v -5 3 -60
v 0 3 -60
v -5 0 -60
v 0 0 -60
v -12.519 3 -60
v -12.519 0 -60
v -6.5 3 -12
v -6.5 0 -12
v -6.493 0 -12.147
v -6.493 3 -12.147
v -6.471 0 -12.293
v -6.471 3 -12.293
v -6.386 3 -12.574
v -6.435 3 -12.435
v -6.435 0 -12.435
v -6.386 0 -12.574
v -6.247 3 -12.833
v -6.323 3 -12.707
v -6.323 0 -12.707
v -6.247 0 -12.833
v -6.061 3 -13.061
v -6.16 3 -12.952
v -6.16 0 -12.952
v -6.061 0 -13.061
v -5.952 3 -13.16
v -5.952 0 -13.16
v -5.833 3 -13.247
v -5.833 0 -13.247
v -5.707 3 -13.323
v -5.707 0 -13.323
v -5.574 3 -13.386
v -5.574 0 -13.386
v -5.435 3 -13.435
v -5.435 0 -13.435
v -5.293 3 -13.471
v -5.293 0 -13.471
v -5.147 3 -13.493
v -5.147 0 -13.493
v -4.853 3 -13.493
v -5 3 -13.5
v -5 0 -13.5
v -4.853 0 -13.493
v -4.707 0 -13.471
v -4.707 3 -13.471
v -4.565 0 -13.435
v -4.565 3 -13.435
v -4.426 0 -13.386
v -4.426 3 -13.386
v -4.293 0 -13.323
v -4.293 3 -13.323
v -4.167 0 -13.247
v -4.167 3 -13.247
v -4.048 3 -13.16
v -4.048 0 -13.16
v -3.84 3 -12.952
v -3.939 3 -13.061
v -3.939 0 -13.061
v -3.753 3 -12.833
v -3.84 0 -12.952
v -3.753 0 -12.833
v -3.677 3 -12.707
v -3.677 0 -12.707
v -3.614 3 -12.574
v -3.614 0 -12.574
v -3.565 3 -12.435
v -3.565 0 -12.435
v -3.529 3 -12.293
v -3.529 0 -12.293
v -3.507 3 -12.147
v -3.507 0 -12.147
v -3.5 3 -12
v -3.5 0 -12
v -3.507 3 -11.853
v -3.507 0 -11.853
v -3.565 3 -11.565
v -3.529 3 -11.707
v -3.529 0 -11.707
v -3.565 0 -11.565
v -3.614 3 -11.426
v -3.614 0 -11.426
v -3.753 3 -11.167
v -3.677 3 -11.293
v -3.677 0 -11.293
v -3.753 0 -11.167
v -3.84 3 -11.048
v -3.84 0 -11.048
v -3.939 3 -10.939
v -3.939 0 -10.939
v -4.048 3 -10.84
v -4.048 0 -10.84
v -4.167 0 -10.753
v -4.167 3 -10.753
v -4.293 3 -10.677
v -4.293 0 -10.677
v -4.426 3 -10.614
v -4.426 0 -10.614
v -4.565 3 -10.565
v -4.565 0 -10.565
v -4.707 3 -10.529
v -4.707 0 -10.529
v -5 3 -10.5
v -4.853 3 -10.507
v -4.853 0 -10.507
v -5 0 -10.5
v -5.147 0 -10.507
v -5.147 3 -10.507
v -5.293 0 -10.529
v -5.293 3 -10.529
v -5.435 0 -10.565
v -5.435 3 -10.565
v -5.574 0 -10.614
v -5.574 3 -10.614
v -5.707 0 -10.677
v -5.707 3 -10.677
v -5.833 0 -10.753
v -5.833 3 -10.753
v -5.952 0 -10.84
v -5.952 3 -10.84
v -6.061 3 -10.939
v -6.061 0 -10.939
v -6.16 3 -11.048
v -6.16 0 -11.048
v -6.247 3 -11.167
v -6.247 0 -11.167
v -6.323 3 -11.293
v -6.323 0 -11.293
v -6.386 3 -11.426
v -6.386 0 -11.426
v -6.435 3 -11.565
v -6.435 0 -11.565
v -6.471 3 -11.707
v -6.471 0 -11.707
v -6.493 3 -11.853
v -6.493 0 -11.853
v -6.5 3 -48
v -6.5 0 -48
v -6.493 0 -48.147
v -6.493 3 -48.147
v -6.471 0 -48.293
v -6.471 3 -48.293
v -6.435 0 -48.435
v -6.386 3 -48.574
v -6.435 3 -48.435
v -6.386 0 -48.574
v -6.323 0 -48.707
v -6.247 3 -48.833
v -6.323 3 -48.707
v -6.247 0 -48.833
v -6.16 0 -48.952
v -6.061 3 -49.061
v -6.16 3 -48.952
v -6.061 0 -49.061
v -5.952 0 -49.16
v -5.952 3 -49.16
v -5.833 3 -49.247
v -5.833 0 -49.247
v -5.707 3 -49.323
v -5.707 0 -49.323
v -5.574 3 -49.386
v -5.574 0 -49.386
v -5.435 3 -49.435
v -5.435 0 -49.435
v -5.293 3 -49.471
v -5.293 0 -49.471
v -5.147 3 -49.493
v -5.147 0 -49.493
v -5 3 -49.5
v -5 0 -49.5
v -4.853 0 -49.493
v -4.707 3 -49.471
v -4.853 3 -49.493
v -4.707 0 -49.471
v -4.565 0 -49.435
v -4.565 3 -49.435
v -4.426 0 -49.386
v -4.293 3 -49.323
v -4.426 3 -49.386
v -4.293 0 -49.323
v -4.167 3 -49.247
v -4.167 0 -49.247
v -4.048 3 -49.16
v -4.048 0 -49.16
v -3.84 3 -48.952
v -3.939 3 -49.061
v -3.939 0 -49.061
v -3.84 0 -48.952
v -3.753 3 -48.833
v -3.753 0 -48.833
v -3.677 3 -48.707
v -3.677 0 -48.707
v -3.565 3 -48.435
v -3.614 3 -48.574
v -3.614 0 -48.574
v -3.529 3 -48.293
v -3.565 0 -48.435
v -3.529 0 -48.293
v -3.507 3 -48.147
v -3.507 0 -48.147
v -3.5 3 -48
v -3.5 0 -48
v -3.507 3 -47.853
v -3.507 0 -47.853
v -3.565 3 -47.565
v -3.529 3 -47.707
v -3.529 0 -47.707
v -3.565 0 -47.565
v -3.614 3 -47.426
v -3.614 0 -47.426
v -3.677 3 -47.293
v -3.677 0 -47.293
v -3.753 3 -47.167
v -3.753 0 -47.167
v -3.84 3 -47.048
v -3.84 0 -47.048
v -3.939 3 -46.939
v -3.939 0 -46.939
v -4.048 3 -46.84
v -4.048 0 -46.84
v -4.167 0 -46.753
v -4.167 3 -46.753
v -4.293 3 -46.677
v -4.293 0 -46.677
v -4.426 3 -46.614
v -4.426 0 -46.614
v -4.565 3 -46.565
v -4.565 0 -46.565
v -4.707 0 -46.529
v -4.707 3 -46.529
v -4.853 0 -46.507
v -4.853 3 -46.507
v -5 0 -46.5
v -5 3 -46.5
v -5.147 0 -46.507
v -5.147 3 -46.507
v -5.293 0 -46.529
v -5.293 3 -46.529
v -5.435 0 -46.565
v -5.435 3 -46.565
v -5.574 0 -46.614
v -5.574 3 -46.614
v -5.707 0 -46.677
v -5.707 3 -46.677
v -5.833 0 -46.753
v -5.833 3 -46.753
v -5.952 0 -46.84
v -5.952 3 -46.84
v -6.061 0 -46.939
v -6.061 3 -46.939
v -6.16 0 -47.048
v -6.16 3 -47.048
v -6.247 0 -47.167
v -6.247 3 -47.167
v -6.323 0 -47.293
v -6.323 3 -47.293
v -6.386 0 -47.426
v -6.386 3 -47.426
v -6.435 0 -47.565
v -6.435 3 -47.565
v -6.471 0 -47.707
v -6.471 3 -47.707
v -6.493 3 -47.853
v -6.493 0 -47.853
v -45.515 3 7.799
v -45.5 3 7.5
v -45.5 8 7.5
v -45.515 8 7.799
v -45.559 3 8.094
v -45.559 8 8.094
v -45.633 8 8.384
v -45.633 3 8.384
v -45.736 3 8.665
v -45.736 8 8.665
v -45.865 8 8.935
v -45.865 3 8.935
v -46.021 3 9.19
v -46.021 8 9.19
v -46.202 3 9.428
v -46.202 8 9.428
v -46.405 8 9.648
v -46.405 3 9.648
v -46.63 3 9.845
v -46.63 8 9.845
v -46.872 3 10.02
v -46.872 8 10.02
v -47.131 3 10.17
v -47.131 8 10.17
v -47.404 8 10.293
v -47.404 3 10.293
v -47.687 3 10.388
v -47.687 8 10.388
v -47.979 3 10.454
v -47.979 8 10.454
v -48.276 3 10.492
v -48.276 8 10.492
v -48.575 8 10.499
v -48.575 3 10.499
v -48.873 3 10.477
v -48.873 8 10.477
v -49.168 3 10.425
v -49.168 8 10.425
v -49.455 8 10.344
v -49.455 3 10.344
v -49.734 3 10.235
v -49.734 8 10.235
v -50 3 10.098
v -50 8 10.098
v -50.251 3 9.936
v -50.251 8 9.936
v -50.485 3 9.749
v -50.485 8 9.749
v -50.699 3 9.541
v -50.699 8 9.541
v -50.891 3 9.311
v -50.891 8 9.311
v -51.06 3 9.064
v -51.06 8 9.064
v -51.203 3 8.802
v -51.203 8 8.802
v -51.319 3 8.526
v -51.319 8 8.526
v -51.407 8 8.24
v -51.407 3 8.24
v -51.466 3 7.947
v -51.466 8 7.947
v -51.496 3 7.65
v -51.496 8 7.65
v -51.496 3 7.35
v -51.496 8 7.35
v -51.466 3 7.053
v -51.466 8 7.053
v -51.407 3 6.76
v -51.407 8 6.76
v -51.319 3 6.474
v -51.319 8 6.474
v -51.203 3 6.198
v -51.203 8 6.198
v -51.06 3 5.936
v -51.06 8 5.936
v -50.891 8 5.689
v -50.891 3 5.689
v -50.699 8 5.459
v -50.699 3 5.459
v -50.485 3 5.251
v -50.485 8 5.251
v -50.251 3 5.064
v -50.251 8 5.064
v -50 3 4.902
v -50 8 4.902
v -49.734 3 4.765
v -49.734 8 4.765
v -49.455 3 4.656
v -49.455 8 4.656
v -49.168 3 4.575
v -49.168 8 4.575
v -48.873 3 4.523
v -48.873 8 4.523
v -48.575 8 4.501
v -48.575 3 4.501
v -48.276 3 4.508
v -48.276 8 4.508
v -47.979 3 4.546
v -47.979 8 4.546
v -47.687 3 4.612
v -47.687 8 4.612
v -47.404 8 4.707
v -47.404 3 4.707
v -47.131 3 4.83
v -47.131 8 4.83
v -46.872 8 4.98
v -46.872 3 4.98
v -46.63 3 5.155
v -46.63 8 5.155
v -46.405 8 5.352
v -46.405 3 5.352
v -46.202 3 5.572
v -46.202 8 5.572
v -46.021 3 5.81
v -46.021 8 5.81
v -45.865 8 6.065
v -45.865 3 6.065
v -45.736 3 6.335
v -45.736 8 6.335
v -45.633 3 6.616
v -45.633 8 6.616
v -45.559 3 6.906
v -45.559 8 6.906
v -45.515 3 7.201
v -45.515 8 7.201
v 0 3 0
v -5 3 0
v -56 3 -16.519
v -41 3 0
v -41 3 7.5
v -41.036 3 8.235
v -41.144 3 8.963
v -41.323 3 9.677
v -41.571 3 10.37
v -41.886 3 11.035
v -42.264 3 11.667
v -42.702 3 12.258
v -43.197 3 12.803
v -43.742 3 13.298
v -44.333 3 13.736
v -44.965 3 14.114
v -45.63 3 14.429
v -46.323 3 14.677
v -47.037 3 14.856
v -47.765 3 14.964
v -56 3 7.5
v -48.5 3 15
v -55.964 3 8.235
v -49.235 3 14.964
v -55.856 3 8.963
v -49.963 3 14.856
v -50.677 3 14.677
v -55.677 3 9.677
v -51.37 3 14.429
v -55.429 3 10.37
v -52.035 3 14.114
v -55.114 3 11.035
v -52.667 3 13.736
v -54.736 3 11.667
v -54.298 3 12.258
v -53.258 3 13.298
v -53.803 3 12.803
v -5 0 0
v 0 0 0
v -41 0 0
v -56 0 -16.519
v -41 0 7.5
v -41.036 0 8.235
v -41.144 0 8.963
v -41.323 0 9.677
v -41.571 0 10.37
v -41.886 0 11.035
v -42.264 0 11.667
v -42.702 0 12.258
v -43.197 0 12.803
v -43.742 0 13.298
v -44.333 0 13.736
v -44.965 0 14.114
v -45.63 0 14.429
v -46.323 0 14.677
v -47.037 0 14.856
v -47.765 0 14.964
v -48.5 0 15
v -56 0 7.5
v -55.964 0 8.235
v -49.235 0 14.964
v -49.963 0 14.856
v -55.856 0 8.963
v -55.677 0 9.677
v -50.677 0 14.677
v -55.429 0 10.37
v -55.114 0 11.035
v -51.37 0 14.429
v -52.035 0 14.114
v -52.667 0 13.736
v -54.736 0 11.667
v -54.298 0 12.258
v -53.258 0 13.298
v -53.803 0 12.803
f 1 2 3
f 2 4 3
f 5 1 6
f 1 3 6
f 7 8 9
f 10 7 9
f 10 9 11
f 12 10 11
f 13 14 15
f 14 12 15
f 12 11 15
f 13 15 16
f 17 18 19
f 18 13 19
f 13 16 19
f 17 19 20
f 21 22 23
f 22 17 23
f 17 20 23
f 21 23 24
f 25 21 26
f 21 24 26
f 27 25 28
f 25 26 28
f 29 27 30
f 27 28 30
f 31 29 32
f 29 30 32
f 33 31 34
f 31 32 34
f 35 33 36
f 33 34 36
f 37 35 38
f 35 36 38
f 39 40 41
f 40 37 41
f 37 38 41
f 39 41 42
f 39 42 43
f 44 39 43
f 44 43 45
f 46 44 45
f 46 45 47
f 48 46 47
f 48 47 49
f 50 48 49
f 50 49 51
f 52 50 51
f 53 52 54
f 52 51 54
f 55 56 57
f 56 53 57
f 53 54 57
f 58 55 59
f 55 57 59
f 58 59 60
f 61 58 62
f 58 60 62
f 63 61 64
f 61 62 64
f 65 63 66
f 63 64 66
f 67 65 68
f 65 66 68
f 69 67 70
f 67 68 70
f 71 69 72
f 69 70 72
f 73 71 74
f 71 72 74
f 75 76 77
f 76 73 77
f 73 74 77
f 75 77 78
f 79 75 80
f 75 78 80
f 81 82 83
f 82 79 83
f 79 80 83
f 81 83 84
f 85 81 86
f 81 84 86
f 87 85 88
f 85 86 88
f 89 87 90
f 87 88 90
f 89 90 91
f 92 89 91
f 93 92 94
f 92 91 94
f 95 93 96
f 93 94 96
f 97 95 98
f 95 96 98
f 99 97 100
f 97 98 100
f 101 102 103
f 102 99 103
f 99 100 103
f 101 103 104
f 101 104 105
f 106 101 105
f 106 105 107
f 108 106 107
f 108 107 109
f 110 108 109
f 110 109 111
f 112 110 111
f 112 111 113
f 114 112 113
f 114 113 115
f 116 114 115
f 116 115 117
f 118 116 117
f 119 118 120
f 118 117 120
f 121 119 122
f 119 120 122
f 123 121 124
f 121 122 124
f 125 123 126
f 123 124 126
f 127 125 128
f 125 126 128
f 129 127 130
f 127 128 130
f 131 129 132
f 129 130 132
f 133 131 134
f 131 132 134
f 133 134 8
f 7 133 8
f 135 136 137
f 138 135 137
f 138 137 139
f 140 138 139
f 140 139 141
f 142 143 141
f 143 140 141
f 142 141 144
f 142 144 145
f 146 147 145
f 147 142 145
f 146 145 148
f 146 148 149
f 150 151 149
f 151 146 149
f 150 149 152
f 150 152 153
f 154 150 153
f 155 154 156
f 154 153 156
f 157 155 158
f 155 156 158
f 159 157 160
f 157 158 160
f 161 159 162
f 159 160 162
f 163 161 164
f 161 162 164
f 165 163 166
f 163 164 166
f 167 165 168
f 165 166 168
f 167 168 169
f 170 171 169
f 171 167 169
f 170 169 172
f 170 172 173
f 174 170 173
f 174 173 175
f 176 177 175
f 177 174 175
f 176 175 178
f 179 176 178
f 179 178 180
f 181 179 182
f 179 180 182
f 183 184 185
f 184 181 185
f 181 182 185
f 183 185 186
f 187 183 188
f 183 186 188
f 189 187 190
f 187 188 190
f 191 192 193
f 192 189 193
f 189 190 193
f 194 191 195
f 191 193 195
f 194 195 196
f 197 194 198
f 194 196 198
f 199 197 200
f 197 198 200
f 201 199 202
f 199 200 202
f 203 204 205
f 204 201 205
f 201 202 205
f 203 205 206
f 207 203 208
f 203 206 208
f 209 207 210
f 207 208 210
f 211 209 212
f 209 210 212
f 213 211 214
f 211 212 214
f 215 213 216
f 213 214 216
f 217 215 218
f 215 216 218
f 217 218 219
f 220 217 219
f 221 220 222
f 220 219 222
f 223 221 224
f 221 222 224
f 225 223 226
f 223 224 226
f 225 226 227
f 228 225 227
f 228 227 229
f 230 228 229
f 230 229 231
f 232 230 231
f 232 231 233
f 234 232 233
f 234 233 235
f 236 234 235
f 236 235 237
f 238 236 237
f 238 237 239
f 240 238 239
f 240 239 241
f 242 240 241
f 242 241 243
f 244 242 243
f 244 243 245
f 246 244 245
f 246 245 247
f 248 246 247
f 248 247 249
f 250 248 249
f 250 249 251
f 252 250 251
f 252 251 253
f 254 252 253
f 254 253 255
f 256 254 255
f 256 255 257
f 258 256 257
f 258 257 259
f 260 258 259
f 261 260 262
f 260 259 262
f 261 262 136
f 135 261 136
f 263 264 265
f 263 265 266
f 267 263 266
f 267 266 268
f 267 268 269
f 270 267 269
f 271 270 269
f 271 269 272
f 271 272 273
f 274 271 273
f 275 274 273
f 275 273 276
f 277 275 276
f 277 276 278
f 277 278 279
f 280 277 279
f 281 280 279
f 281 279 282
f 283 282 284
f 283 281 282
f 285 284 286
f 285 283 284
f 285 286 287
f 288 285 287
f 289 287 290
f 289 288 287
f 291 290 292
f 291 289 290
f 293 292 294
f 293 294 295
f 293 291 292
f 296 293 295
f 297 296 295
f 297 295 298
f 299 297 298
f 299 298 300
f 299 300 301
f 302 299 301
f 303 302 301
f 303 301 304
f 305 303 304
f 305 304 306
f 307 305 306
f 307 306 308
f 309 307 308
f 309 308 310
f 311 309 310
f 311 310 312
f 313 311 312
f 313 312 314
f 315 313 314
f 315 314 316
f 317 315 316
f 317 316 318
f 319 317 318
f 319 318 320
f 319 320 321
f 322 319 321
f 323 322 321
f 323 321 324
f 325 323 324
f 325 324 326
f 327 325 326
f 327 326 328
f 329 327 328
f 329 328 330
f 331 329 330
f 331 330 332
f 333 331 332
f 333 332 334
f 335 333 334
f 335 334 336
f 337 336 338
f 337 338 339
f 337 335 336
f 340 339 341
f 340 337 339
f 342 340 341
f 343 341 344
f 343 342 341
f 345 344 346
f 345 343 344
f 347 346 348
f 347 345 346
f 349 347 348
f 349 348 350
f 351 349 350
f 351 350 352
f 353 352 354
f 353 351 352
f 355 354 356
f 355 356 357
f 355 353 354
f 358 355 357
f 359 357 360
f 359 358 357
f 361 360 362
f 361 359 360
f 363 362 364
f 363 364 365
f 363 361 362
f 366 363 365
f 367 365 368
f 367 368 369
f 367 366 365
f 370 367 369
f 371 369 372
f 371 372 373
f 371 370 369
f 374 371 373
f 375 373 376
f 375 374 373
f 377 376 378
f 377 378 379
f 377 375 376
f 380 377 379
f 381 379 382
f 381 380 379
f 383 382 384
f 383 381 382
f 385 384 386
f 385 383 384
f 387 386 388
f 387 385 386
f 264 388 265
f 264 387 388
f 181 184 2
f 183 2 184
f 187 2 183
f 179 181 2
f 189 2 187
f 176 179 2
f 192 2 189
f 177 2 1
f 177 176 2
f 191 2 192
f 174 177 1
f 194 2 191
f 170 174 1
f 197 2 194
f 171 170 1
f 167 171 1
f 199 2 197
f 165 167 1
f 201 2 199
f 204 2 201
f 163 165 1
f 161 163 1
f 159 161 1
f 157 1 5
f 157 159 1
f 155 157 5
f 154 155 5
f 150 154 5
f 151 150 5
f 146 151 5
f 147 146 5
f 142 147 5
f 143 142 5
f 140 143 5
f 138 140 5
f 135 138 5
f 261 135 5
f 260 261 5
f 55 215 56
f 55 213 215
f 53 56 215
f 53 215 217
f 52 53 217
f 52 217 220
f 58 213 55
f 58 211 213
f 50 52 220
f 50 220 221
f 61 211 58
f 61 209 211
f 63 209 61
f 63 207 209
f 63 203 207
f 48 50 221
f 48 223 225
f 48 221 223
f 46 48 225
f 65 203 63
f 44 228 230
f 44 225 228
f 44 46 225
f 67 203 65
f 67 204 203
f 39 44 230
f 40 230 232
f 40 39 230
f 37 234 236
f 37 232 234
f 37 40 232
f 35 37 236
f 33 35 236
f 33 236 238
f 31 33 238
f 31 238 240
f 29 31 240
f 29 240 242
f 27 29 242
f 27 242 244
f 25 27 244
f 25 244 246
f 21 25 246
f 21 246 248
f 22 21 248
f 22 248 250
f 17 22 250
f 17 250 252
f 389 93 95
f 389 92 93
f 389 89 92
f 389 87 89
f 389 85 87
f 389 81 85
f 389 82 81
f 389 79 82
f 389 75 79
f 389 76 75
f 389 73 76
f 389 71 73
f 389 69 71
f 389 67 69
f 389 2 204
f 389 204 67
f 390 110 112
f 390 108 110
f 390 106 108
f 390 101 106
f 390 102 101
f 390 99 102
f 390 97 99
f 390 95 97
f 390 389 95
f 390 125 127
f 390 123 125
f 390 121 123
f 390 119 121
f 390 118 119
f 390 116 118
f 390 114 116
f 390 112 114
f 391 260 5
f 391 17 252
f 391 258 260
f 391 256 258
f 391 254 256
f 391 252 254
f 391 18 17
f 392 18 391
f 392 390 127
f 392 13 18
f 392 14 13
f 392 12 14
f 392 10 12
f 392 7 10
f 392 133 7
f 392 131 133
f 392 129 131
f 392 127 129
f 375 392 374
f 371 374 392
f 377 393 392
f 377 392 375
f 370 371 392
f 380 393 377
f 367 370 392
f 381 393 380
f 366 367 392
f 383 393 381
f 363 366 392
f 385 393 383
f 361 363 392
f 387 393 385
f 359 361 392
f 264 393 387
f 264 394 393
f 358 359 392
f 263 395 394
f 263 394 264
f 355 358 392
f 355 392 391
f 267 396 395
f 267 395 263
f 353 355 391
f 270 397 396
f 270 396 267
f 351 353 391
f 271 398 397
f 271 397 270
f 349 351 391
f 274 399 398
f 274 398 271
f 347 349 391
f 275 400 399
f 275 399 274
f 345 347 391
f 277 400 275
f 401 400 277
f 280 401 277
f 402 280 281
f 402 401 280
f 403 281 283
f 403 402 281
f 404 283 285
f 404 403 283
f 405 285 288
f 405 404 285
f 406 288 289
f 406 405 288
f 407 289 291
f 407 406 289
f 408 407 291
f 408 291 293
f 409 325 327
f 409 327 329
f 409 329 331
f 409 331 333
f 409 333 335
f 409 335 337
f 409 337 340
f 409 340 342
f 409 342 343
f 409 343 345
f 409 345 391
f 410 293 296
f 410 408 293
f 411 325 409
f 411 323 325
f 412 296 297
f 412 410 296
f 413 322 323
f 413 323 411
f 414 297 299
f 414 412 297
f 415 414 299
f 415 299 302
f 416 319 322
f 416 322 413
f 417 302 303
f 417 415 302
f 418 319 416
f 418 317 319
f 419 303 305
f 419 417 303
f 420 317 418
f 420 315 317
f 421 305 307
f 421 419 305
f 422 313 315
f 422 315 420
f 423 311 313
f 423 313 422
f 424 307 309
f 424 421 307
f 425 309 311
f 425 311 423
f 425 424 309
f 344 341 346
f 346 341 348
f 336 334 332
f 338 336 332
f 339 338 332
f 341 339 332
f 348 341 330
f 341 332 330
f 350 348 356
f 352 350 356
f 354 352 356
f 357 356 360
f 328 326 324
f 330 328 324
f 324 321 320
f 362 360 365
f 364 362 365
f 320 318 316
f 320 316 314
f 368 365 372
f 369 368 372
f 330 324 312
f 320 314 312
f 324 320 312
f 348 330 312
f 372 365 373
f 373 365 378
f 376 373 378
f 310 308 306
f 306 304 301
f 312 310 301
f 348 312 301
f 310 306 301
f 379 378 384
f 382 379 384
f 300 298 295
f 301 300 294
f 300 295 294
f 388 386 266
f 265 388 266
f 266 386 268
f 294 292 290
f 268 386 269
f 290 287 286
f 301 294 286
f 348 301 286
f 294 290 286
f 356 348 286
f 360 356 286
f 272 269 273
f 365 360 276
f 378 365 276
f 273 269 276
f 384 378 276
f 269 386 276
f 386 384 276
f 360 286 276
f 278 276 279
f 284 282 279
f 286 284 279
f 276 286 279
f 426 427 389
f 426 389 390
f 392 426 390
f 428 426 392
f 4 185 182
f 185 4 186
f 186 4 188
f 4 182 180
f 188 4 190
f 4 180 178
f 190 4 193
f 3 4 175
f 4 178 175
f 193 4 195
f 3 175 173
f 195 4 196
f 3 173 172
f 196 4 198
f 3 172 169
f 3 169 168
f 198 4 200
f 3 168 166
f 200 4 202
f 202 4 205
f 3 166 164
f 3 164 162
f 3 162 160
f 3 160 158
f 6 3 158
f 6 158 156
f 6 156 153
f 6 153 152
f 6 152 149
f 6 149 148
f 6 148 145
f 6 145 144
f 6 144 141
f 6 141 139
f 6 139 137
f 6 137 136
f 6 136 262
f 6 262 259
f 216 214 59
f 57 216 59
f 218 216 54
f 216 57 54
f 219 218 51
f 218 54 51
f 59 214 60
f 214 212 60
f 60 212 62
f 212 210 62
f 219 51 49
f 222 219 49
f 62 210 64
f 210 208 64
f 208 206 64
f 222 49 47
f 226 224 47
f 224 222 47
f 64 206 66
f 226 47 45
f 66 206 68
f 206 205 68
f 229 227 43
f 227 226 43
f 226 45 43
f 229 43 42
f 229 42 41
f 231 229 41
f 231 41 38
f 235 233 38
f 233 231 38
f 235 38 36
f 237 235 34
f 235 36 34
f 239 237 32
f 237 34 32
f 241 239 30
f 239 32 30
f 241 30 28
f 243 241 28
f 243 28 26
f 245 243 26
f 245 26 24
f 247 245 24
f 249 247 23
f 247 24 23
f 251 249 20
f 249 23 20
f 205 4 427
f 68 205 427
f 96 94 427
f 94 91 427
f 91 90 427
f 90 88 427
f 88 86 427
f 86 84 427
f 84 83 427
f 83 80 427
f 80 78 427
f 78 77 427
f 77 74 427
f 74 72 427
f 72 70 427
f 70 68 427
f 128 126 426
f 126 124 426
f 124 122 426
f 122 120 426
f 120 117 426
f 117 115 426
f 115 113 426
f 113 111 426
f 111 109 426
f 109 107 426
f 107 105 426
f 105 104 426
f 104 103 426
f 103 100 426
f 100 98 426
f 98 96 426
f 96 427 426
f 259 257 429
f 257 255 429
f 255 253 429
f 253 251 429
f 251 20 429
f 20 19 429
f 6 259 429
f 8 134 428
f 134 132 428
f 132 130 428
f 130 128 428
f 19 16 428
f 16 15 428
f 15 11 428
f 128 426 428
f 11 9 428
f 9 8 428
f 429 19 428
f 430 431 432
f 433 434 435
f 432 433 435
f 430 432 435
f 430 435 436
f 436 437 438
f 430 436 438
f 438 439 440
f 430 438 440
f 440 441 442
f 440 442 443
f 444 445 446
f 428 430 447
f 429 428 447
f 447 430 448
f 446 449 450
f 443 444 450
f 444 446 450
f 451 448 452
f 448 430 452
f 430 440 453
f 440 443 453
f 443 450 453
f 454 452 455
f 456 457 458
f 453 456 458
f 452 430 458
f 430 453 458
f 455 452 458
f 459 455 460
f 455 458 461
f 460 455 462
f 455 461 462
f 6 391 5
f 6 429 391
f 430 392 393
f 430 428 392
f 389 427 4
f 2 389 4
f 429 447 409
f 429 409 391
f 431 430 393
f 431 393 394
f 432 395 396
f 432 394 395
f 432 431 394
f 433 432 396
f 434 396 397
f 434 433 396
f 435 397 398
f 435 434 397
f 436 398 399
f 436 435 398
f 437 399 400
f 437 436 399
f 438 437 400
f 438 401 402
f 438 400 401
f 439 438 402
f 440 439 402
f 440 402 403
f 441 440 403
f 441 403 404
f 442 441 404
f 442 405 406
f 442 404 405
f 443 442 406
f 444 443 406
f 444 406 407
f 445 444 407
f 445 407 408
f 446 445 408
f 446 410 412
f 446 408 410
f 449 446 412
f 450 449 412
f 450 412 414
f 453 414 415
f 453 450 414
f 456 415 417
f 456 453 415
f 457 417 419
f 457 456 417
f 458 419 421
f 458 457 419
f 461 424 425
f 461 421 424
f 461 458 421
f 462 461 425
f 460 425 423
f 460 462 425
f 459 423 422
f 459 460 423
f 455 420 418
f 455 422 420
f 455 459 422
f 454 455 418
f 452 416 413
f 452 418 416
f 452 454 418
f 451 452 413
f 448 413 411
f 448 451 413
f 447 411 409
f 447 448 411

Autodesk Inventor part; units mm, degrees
ref_plane "YZ Plane" through (0, 0, 0) normal (1, 0, 0) x (0, 1, 0)
ref_plane "XZ Plane" through (0, 0, 0) normal (0, 1, 0) x (-1, 0, 0)
ref_plane "XY Plane" through (0, 0, 0) normal (0, 0, 1) x (1, 0, 0)
sketch "Sketch3" plane through (0, 0, 0) normal (0, 1, 0) x (-1, 0, 0)
  line L0 (0, 0) -> (0, -60)
  line L1 (0, 0) -> (60, 0) construction
  line L2 (0, -60) -> (12.519, -60)
  line L3 (0, 0) -> (41, 0)
  line L4 (41, 0) -> (41, 7.5)
  line L5 (41, 7.5) -> (56, 7.5)
  circle A0 centre (48.5, 7.5) radius 7.5
  circle A1 centre (48.5, 7.5) radius 3
  line L6 (56, 7.5) -> (56, -16.519)
  line L7 (56, -16.519) -> (12.519, -60)
  line L8 (0, -30) -> (5, -30)
  line L9 (5, -60) -> (5, -48)
  line L10 (5, 0) -> (5, -12)
  circle A2 centre (5, -12) radius 1.5
  circle A3 centre (5, -48) radius 1.5
  dimension "d6" = 60
  dimension "d7" = 90
  dimension "d8" = 12.519
  dimension "d9" = 41
  dimension "d10" = 7.5
  dimension "d11" = 15
  dimension "d12" = 6
  dimension "d13" = 24.019
  dimension "d18" = 5
  dimension "d19" = 12
  dimension "d20" = 12
  dimension "d21" = 3
  dimension "d22" = 3
extrude "Extrusion1" add sketch "Sketch3" along normal blind 3 contours L3 L4 A0 L6 L7 L2 L0 | A0 L5 A1 | L5 A1 A0 | L5 A1 picked at (49.4145, 6.796)
sketch "Sketch4" plane through (0, 0, 0) normal (0, -1, 0) x (1, 0, 0)
  line L0 (-51.5, 7.5) -> (-45.5, 7.5) projected
  line L1 (-45.5, 7.5) -> (-51.5, 7.5) projected
  circle A0 centre (-48.5, 7.5) radius 3
  point P0 (0, 0)
extrude "Extrusion2" add sketch "Sketch4" against normal blind 8
properties part number "sideplateshaft_std"
